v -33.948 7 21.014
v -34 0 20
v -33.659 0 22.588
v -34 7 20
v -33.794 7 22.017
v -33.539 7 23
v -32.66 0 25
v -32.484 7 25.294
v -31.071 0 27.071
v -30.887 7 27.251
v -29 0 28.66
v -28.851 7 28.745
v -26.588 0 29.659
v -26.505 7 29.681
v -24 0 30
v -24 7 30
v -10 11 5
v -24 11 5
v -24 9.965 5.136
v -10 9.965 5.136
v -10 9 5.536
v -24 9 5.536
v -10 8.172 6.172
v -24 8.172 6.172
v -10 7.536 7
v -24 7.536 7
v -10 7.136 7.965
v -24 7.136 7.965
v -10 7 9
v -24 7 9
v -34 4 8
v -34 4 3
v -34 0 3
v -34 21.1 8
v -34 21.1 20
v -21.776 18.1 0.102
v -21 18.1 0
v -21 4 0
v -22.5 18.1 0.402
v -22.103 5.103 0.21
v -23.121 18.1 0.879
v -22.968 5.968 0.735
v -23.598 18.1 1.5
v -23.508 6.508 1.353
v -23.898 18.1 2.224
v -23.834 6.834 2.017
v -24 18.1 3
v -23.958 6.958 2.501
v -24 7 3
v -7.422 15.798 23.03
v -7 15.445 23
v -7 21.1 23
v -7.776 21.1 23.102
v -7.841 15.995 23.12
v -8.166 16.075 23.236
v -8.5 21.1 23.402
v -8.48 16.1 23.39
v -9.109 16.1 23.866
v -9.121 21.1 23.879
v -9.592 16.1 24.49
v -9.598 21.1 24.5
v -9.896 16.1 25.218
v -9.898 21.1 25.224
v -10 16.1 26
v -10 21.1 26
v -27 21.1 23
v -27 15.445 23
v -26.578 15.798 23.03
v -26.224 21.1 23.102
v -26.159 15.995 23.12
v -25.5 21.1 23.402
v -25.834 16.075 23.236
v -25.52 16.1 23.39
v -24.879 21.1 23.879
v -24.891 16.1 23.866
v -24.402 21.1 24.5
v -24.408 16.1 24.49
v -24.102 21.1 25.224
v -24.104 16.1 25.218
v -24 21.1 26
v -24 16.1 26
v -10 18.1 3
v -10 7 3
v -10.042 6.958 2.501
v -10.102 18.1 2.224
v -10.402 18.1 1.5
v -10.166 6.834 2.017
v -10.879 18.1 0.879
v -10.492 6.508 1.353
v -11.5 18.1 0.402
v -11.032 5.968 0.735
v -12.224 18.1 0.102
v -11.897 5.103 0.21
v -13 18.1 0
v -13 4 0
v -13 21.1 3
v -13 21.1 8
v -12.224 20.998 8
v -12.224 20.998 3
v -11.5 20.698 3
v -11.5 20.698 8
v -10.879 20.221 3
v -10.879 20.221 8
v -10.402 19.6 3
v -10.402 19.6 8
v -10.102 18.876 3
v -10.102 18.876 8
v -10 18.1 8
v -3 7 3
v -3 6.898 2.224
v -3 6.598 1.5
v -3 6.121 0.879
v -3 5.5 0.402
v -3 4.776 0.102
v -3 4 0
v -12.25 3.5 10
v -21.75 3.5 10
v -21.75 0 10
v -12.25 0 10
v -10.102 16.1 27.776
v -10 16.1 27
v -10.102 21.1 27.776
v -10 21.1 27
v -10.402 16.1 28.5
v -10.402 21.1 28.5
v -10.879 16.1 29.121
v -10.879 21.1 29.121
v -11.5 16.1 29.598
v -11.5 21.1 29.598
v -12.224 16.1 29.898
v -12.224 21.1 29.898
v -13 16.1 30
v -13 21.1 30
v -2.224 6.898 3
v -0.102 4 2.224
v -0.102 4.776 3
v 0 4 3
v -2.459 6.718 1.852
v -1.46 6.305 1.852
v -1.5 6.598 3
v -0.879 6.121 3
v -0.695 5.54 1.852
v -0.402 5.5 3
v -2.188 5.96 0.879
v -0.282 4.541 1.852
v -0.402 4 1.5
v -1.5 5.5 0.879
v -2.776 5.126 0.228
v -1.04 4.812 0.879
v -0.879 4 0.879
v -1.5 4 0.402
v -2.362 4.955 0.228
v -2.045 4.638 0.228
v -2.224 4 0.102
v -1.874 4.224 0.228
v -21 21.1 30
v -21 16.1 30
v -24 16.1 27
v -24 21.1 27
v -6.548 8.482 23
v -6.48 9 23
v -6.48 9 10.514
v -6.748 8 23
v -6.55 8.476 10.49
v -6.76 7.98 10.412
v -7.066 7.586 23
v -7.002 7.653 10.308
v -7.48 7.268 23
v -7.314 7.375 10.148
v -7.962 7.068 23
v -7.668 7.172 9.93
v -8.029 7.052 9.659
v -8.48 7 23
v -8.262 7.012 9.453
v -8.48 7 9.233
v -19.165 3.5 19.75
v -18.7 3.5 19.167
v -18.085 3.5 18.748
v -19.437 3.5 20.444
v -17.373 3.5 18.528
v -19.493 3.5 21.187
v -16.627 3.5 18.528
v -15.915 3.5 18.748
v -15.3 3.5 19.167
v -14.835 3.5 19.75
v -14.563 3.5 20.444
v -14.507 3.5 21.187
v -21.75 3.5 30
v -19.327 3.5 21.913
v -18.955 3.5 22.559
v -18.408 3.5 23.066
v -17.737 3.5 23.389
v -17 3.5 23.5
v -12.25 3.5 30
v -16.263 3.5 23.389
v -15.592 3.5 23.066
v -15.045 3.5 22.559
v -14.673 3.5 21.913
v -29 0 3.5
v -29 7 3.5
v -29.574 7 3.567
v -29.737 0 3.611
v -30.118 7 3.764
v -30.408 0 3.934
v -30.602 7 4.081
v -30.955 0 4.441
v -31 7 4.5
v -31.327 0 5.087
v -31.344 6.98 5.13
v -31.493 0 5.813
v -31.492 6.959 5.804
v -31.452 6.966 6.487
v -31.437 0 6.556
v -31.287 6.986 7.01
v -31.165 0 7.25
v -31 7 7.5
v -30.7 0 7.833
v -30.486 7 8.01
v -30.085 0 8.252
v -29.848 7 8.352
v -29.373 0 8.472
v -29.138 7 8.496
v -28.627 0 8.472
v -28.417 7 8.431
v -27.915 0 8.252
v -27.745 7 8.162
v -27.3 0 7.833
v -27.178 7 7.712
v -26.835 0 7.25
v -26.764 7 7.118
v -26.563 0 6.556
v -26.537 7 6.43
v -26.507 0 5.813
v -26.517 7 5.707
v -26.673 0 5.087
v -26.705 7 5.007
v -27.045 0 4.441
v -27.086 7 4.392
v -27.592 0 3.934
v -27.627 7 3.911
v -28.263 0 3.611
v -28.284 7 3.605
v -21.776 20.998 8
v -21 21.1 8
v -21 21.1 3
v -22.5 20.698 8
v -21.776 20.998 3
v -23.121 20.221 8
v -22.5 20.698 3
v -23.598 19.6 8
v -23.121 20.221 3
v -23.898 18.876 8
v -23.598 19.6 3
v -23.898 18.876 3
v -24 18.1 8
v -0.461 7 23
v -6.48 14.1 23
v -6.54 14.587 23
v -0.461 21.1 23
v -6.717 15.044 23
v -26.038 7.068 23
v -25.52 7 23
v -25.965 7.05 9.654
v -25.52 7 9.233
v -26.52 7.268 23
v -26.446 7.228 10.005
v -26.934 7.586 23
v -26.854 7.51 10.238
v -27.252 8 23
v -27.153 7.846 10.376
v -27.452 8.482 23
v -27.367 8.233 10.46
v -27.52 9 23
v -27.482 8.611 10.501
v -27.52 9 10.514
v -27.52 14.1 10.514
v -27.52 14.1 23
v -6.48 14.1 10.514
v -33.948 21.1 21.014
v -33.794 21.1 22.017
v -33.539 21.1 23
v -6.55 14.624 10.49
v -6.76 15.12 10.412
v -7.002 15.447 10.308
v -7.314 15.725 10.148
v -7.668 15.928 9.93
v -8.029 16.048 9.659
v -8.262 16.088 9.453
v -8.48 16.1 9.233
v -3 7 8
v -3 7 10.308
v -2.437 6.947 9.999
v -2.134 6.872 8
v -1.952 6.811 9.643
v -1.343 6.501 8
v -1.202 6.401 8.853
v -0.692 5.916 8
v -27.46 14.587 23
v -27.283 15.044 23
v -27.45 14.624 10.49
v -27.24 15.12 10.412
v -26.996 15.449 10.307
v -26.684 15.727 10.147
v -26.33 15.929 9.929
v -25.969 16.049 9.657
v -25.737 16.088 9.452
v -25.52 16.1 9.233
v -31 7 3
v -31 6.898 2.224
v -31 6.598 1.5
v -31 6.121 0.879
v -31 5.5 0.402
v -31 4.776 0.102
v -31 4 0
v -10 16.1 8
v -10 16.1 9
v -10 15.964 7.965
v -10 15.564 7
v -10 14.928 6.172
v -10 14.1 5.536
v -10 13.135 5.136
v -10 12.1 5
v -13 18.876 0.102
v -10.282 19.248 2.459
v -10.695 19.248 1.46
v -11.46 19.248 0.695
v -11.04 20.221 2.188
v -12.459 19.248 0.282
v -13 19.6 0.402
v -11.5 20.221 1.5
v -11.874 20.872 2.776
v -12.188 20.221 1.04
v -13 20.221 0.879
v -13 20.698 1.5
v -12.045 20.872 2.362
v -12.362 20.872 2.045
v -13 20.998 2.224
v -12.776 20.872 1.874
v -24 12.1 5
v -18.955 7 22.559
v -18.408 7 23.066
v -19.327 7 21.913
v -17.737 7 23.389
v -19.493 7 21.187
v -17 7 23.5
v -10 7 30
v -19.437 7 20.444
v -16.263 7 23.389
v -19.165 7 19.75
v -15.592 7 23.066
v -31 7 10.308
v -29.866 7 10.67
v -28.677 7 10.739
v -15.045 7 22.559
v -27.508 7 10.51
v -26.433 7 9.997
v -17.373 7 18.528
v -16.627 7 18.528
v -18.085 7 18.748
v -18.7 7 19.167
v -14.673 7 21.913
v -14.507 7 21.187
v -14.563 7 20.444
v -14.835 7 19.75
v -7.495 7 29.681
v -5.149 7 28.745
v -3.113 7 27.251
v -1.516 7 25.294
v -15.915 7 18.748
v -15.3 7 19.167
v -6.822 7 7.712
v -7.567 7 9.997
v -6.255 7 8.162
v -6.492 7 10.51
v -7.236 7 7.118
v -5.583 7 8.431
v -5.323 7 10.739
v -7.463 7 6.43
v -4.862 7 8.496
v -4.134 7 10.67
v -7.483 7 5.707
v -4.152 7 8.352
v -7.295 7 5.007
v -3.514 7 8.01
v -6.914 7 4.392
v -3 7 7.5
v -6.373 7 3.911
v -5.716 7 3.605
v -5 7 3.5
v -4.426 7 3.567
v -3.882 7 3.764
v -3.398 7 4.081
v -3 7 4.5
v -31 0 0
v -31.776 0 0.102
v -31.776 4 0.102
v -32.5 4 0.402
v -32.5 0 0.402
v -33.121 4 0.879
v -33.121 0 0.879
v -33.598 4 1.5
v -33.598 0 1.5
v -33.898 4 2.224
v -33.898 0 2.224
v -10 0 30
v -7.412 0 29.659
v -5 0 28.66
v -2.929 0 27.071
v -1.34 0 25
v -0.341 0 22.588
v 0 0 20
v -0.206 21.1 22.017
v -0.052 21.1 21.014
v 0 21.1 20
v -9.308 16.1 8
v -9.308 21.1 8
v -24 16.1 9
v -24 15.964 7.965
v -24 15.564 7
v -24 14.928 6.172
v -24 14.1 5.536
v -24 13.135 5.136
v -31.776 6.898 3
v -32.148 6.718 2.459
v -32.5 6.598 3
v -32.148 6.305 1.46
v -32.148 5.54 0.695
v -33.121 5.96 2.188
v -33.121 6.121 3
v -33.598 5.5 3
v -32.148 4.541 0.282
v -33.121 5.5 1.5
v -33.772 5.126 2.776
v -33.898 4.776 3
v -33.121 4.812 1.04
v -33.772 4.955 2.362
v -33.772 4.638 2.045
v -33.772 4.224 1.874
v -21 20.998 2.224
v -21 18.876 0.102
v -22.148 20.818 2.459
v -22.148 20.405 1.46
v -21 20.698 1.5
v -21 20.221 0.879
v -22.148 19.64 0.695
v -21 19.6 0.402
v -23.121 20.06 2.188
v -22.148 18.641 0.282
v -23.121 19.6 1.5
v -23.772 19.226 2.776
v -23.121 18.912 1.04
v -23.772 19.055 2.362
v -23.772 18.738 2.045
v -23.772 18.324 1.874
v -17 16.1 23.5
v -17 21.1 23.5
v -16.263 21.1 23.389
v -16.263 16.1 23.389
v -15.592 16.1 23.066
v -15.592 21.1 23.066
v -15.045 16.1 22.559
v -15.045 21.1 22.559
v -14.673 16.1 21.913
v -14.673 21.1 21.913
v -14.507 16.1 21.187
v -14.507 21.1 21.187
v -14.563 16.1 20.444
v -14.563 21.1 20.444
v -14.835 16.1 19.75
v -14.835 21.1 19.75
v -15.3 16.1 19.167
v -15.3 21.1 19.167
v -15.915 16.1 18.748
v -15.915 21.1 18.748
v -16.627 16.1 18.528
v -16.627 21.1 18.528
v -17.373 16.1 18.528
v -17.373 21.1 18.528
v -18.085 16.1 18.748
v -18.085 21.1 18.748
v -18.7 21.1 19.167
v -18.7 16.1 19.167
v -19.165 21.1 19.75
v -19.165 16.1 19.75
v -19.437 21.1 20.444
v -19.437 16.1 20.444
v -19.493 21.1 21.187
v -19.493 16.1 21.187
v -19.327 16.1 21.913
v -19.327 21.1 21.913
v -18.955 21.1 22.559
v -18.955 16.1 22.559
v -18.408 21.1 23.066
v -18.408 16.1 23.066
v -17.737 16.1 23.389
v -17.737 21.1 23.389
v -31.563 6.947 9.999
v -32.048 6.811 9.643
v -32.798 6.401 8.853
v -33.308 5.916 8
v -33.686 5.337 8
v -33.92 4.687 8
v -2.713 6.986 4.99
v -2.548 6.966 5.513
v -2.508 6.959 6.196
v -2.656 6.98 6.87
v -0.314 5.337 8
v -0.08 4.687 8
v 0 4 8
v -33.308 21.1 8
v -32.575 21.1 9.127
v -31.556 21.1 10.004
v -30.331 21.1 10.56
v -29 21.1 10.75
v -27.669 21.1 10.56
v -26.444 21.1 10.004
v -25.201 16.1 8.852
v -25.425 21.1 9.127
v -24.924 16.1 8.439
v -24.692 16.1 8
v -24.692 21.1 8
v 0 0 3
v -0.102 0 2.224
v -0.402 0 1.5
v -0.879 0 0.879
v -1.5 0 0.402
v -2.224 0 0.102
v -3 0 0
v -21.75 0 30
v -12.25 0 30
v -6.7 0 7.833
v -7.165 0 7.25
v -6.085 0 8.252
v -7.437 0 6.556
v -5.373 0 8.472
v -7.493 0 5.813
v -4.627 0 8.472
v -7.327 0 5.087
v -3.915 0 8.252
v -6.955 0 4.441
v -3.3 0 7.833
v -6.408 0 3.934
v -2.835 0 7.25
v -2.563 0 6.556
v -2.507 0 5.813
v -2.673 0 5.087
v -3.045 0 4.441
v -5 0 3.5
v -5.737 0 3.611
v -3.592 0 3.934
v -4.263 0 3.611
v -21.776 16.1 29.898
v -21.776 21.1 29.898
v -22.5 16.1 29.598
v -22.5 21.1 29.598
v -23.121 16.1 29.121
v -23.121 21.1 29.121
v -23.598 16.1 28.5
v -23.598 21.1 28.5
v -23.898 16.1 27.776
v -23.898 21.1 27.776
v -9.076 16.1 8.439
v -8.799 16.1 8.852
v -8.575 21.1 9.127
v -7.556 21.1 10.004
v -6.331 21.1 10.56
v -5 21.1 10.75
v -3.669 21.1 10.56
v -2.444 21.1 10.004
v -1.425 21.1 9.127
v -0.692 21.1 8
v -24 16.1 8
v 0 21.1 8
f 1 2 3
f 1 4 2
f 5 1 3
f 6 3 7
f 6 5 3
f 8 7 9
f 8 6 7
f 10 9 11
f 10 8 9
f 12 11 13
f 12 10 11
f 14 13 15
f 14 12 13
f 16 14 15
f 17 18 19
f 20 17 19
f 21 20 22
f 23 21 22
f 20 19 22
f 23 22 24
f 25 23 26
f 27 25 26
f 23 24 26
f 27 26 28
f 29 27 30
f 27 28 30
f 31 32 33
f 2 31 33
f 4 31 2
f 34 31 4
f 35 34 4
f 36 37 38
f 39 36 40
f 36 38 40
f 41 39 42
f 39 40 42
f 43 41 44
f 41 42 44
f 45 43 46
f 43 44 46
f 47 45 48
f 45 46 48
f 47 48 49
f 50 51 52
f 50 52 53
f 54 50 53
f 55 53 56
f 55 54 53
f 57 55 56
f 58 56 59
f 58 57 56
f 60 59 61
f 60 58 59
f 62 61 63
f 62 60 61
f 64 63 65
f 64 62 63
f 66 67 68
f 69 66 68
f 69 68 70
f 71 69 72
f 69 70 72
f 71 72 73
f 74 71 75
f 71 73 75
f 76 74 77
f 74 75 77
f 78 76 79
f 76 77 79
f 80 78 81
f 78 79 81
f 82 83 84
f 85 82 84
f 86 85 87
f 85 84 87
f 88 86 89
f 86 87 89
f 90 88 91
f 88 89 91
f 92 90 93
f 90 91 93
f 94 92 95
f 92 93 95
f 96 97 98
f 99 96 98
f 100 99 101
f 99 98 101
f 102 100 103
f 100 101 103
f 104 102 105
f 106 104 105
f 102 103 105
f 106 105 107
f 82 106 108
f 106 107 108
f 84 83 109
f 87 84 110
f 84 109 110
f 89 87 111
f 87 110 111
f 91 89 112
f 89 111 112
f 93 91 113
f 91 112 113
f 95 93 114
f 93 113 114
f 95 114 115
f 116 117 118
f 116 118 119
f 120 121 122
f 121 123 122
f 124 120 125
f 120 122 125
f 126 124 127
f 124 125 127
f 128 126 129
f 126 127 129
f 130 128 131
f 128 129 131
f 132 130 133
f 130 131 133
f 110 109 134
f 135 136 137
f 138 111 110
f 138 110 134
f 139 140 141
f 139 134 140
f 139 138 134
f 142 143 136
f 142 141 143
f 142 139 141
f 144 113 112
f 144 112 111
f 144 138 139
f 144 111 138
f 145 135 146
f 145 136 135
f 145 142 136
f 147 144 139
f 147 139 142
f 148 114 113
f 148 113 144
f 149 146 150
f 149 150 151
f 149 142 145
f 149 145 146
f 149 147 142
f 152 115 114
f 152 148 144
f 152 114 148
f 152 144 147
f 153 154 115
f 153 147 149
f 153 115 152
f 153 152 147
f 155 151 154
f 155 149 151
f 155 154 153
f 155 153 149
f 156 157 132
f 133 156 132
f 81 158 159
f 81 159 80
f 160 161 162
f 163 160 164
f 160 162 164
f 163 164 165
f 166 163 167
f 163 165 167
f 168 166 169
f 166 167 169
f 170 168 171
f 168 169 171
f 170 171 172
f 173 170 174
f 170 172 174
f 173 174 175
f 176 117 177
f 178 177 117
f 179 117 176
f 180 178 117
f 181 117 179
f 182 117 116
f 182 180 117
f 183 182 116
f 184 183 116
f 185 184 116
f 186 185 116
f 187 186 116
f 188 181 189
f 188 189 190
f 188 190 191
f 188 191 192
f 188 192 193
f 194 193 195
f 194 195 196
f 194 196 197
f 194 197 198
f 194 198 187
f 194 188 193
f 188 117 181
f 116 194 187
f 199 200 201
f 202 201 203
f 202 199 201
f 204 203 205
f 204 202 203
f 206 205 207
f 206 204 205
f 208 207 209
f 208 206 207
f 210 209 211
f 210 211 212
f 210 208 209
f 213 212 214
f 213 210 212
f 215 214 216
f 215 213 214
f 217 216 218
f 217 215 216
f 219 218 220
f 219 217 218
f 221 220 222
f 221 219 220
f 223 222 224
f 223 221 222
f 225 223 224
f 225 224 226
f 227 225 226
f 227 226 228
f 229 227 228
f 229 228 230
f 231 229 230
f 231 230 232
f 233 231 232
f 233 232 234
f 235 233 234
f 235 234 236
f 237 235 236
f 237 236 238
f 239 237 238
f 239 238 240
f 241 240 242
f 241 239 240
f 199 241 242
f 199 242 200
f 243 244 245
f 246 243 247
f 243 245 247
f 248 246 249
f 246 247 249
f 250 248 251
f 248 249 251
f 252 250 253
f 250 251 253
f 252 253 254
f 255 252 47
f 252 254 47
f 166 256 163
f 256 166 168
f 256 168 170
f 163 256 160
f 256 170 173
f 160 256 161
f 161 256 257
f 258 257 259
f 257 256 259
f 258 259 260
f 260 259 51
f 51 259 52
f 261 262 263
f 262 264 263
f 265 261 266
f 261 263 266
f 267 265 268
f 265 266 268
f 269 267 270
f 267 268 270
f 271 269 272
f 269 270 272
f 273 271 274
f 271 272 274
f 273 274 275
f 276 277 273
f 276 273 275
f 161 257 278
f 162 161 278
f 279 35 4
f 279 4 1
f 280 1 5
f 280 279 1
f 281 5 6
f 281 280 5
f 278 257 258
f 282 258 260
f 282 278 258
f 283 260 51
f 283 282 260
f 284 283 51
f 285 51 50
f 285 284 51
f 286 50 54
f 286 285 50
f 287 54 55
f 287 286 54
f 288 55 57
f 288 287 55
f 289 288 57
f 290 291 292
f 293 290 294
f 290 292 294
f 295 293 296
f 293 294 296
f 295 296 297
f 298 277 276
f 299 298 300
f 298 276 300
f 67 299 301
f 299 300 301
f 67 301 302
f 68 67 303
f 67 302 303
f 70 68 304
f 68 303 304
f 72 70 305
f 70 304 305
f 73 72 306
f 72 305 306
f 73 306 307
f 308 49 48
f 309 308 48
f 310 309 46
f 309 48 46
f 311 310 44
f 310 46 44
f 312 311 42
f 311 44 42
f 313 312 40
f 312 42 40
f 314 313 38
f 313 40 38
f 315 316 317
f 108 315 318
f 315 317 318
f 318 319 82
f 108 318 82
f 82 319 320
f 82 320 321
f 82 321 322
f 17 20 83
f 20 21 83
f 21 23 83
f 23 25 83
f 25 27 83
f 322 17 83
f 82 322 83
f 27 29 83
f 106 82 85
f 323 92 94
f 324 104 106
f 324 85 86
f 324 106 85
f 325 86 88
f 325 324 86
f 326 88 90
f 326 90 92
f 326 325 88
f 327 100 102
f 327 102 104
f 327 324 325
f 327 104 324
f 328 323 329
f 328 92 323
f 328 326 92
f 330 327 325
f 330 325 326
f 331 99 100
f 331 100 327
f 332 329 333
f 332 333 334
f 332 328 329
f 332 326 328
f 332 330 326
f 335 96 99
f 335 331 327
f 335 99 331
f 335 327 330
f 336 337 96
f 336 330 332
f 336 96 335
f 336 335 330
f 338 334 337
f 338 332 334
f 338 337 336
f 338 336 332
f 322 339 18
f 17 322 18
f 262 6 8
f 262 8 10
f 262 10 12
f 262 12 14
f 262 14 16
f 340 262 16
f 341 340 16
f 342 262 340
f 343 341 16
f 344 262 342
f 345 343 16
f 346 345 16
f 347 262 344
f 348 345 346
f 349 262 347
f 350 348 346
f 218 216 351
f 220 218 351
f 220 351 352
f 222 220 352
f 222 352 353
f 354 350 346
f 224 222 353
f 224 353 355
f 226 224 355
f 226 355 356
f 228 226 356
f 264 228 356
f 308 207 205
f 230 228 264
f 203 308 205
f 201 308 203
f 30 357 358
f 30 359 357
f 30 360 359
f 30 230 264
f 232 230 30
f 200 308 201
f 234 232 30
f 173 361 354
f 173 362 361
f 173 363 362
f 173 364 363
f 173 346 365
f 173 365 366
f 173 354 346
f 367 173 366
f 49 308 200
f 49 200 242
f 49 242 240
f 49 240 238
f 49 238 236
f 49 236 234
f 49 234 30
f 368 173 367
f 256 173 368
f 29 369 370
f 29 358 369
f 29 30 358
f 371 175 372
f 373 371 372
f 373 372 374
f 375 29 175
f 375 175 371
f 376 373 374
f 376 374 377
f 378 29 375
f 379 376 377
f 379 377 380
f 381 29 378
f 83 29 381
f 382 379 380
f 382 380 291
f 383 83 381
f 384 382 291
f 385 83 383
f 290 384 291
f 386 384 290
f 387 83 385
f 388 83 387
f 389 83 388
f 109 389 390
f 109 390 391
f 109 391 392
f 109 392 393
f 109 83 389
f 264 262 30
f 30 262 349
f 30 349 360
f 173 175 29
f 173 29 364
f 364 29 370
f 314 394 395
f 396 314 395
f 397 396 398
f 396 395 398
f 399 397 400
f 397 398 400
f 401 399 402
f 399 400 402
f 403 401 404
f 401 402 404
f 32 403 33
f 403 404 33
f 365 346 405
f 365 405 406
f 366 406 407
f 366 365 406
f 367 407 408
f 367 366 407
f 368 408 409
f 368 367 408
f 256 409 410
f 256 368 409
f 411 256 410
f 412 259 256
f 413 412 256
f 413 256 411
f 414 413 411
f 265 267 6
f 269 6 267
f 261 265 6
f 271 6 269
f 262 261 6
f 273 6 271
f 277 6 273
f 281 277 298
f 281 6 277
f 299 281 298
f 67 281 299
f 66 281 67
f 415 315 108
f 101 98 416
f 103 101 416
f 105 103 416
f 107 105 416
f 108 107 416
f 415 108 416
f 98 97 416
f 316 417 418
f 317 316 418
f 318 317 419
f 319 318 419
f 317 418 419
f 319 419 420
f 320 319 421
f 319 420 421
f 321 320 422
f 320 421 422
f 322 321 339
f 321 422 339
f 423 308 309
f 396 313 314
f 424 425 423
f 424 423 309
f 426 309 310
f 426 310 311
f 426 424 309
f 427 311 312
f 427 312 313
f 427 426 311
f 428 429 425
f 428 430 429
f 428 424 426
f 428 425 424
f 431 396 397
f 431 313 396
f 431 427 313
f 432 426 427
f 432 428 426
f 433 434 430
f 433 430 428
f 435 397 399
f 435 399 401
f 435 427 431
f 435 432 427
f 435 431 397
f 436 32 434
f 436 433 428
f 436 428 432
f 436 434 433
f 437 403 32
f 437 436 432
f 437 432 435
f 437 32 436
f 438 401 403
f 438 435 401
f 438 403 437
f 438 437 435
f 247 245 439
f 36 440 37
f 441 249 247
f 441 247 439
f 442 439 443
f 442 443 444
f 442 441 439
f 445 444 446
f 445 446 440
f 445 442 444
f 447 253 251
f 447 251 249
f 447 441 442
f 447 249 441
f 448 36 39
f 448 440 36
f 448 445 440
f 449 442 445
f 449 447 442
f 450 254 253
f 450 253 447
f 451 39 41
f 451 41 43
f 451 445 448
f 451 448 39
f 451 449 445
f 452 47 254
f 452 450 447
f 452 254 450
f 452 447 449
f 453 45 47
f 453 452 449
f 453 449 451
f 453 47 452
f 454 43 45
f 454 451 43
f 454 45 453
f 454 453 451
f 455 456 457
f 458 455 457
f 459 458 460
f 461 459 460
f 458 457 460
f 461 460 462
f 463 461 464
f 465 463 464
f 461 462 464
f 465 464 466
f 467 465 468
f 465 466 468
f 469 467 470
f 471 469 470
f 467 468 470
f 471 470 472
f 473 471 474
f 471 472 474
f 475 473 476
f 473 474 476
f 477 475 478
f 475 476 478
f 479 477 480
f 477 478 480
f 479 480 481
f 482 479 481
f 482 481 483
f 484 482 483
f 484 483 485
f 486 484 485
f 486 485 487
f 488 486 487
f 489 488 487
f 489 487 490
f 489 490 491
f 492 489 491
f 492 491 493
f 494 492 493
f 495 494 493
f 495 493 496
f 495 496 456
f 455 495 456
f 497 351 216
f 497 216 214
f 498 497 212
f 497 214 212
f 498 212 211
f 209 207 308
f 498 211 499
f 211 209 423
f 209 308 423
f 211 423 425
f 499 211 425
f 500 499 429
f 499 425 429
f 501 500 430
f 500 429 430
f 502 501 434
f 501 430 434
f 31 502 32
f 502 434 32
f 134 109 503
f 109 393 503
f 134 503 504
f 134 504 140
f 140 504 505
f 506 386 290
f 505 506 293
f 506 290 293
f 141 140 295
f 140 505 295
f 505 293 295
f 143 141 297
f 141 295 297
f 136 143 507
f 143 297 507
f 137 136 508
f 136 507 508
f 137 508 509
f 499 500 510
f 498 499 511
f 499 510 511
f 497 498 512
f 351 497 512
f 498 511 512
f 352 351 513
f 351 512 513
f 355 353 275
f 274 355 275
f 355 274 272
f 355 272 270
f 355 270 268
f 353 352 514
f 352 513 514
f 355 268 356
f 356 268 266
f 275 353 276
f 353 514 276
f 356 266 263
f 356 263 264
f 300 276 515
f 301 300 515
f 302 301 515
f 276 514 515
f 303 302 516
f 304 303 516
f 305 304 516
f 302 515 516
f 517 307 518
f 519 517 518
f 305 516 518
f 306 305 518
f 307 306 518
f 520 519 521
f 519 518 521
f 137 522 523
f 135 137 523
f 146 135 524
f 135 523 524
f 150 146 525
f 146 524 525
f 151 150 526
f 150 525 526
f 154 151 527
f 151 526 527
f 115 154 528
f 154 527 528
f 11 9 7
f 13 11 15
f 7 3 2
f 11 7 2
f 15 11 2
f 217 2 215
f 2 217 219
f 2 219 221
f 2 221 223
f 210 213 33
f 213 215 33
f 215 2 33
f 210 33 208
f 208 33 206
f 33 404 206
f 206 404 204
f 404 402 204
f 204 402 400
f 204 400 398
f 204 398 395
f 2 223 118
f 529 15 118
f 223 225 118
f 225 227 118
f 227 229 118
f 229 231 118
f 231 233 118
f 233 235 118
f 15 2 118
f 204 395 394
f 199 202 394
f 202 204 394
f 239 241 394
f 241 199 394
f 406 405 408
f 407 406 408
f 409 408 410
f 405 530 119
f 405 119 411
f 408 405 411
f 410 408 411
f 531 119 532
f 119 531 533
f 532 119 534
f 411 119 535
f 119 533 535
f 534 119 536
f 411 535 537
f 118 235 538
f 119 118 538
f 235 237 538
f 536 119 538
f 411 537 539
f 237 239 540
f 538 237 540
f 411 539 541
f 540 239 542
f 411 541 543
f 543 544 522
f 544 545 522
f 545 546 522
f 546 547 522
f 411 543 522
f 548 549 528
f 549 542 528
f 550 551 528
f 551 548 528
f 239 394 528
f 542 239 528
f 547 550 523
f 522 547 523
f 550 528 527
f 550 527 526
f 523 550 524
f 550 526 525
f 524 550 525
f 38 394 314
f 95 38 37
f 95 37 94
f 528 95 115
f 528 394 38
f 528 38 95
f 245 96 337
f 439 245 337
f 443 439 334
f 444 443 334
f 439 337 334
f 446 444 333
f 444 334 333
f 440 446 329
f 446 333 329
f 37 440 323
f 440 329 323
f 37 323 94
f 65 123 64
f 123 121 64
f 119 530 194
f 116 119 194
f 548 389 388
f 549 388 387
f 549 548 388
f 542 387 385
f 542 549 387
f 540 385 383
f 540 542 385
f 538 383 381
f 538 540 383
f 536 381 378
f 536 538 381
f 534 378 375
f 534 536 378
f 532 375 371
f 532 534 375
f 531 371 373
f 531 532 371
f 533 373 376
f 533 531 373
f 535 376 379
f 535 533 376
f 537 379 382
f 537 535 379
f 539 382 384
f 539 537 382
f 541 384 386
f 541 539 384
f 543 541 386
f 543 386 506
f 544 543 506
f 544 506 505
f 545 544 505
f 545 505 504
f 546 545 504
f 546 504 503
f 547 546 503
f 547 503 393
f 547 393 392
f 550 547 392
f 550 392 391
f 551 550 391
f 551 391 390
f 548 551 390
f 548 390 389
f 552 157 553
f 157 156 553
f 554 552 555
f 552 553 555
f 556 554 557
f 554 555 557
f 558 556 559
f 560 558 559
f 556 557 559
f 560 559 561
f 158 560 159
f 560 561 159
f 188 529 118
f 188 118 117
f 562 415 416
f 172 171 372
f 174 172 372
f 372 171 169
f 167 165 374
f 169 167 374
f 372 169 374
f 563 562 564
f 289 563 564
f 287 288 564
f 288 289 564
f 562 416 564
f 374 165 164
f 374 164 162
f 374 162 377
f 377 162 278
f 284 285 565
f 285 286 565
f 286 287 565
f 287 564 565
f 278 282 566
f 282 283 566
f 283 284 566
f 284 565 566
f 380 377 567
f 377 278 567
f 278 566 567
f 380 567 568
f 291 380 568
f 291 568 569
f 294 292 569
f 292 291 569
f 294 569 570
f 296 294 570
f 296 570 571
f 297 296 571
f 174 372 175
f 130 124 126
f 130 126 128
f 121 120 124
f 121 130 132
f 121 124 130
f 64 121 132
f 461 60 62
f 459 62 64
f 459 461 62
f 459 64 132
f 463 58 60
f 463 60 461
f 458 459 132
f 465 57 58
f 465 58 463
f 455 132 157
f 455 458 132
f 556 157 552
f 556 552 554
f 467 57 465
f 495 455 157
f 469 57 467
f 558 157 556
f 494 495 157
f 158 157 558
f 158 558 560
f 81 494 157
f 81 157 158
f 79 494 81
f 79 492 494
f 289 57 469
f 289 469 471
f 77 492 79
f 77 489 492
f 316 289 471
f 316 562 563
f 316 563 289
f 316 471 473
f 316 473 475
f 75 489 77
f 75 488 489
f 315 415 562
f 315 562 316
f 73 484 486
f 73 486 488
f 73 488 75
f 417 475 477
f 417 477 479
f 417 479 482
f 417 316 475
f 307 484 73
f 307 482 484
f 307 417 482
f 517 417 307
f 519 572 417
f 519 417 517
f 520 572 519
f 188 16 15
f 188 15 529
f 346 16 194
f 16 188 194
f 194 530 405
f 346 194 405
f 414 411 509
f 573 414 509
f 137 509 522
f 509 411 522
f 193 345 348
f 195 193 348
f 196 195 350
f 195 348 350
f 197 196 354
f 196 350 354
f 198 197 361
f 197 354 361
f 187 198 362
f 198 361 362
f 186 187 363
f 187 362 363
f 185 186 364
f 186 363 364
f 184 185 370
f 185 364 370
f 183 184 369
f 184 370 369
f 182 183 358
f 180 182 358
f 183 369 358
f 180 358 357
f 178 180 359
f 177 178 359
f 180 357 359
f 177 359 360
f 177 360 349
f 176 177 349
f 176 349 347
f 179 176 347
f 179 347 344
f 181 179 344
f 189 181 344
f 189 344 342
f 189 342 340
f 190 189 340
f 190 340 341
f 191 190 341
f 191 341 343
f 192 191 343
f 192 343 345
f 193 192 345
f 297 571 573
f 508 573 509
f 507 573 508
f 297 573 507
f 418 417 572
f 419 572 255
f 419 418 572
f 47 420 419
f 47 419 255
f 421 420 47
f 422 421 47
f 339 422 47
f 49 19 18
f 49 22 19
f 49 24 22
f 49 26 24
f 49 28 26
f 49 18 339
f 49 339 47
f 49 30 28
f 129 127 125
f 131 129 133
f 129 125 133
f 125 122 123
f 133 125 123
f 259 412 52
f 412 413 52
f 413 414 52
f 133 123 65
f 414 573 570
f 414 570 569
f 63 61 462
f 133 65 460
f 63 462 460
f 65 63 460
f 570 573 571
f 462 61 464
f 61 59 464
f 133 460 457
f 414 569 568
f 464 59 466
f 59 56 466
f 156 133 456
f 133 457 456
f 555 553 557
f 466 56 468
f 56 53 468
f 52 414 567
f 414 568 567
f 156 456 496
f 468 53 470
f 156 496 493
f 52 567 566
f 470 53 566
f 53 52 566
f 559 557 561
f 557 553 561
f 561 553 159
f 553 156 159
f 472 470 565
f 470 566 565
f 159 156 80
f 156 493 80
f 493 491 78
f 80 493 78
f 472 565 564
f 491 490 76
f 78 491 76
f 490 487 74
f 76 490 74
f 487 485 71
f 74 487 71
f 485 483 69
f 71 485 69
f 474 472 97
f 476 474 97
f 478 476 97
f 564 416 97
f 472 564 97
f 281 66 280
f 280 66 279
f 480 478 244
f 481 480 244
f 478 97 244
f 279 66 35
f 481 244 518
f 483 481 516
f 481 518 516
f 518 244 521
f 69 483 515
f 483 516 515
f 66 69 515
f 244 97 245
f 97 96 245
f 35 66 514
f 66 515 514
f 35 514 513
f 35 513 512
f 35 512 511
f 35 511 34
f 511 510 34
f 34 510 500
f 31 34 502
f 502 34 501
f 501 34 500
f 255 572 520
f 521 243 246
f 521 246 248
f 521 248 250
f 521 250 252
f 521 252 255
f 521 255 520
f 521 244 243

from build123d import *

# Parameters (mm, degrees)
CROQUIS1_W              = 34
CROQUIS1_H              = 30
CROQUIS1_R              = 2.5
SALIENTE_EXTRUIR1_DEPTH = 7
REDONDEO1_R             = 10
CROQUIS2_W              = 14
CROQUIS2_H              = 30
SALIENTE_EXTRUIR2_DEPTH = 14.1
CORTAR_EXTRUIR1_REACH   = 45.832
CORTAR_EXTRUIR2_REACH   = 52.012
CROQUIS4_R              = 2.5
CROQUIS5_W              = 9.5
CROQUIS5_H              = 3.5
CORTAR_EXTRUIR3_DEPTH   = 20
SALIENTE_EXTRUIR3_DEPTH = 5
SALIENTE_EXTRUIR4_DEPTH = 9.1
CORTAR_EXTRUIR4_REACH   = 52.012
CROQUIS8_R              = 4.75
REDONDEO5_R             = 2
REDONDEO6_R             = 3
REDONDEO7_R             = 3


with BuildPart() as part:
    # Croquis1 → Saliente-Extruir1 (new body)
    with BuildSketch(Plane(origin=(0, 0, 0), x_dir=(1, 0, 0), z_dir=(0, 1, 0))):
        with Locations((-17, -15)):
            Rectangle(CROQUIS1_W, CROQUIS1_H)
        with Locations(Location((-29, -6, 0), (0, 0, 90))):
            Circle(CROQUIS1_R, mode=Mode.SUBTRACT)
        with Locations(Location((-5, -6, 0), (0, 0, 90))):
            Circle(CROQUIS1_R, mode=Mode.SUBTRACT)
    extrude(amount=SALIENTE_EXTRUIR1_DEPTH)

    # Redondeo1
    redondeo1_edges = [part.edges().sort_by_distance(p)[0] for p in [
        (0, 3.5, 30),
        (-34, 3.5, 30),
    ]]
    fillet(redondeo1_edges, radius=REDONDEO1_R)

    # Croquis2 → Saliente-Extruir2 (add)
    with BuildSketch(Plane(origin=(0, 7, 0), x_dir=(1, 0, 0), z_dir=(0, 1, 0))):
        with Locations((-17, -15)):
            Rectangle(CROQUIS2_W, CROQUIS2_H)
    extrude(amount=SALIENTE_EXTRUIR2_DEPTH)

    # Croquis3 → Cortar-Extruir1 (cut, up to next)
    with BuildSketch(Plane.ZY.offset(24), mode=Mode.PRIVATE) as cortar_extruir1_sk1:
        with BuildLine():
            Line((9, 7), (30, 7))
            Line((30, 7), (30, 16.1))
            Line((30, 16.1), (23, 16.1))
            Line((23, 16.1), (9, 16.1))
            ThreePointArc((9, 16.1), (6.171572875, 14.928427125), (5, 12.1))
            Line((5, 12.1), (5, 11))
            ThreePointArc((5, 11), (6.171572875, 8.171572875), (9, 7))
        make_face()
    cortar_extruir1_tool1 = extrude(cortar_extruir1_sk1.sketch, amount=-CORTAR_EXTRUIR1_REACH, mode=Mode.PRIVATE) & part.part
    add(cortar_extruir1_tool1.solids().sort_by_distance((-24, 11.55, 17.861257))[0], mode=Mode.SUBTRACT)

    # Cortar-Extruir2: up to this face of the body (flat: up to its plane)
    cortar_extruir2_end = Plane(part.part.faces().sort_by_distance((-17, 0, 14.792595458))[0])
    # Croquis4 → Cortar-Extruir2 (cut, up to the picked face)
    with BuildSketch(Plane(origin=(0, 21.1, 0), x_dir=(1, 0, 0), z_dir=(0, 1, 0)), mode=Mode.PRIVATE) as cortar_extruir2_sk1:
        with Locations(Location((-17, -21, 0), (0, 0, 270))):
            Circle(CROQUIS4_R)
    cortar_extruir2_tool1 = split(extrude(cortar_extruir2_sk1.sketch, amount=-CORTAR_EXTRUIR2_REACH, mode=Mode.PRIVATE), bisect_by=cortar_extruir2_end, keep=Keep.BOTH, mode=Mode.PRIVATE)
    add(cortar_extruir2_tool1.solids().sort_by(Axis((-17, 21.1, 21), (0, -1, 0)))[0], mode=Mode.SUBTRACT)

    # Croquis5 → Cortar-Extruir3 (cut)
    with BuildSketch(Plane.XY.offset(30)):
        with Locations((-17, 1.75)):
            Rectangle(CROQUIS5_W, CROQUIS5_H)
    extrude(amount=-CORTAR_EXTRUIR3_DEPTH, mode=Mode.SUBTRACT)

    # Croquis6 → Saliente-Extruir3 (add)
    with BuildSketch(Plane(origin=(0, 21.1, 0), x_dir=(1, 0, 0), z_dir=(0, 1, 0))):
        with BuildLine():
            Line((-24, -23), (-33.539392014, -23))
            ThreePointArc((-33.539392014, -23), (-33.884177258, -21.517576993), (-34, -20))
            Line((-34, -20), (-34, -8))
            Line((-34, -8), (-24, -8))
            Line((-24, -8), (-24, -23))
        make_face()
        with BuildLine():
            Line((-10, -23), (-0.460607986, -23))
            ThreePointArc((-0.460607986, -23), (-0.115822742, -21.517576993), (0, -20))
            Line((0, -20), (0, -8))
            Line((0, -8), (-10, -8))
            Line((-10, -8), (-10, -23))
        make_face()
    extrude(amount=-SALIENTE_EXTRUIR3_DEPTH)

    # Croquis7 → Saliente-Extruir4 (add)
    with BuildSketch(Plane.XZ.offset(-16.1)):
        with BuildLine():
            Line((-27.52, 8), (-34, 8))
            Line((-34, 8), (-34, 20))
            ThreePointArc((-34, 20), (-33.884177258, 21.517576993), (-33.539392014, 23))
            Line((-33.539392014, 23), (-27.52, 23))
            Line((-27.52, 23), (-27.52, 8))
        make_face()
        with BuildLine():
            Line((0, 8), (0, 20))
            ThreePointArc((0, 20), (-0.115822742, 21.517576993), (-0.460607986, 23))
            Line((-0.460607986, 23), (-6.48, 23))
            Line((-6.48, 23), (-6.48, 8))
            Line((-6.48, 8), (0, 8))
        make_face()
    extrude(amount=SALIENTE_EXTRUIR4_DEPTH)

    # Cortar-Extruir4: up to this face of the body (flat: up to its plane)
    cortar_extruir4_end = Plane(part.part.faces().sort_by_distance((-17, 7, 16.508515524))[0])
    # Croquis8 → Cortar-Extruir4 (cut, up to the picked face)
    with BuildSketch(Plane(origin=(0, 21.1, 0), x_dir=(1, 0, 0), z_dir=(0, 1, 0)), mode=Mode.PRIVATE) as cortar_extruir4_sk1:
        with Locations((-29, -6)):
            Circle(CROQUIS8_R)
    cortar_extruir4_tool1 = split(extrude(cortar_extruir4_sk1.sketch, amount=-CORTAR_EXTRUIR4_REACH, mode=Mode.PRIVATE), bisect_by=cortar_extruir4_end, keep=Keep.BOTH, mode=Mode.PRIVATE)
    # Croquis8 → Cortar-Extruir4 (cut, up to the picked face)
    with BuildSketch(Plane(origin=(0, 21.1, 0), x_dir=(1, 0, 0), z_dir=(0, 1, 0)), mode=Mode.PRIVATE) as cortar_extruir4_sk2:
        with Locations((-5, -6)):
            Circle(CROQUIS8_R)
    cortar_extruir4_tool2 = split(extrude(cortar_extruir4_sk2.sketch, amount=-CORTAR_EXTRUIR4_REACH, mode=Mode.PRIVATE), bisect_by=cortar_extruir4_end, keep=Keep.BOTH, mode=Mode.PRIVATE)
    add(cortar_extruir4_tool1.solids().sort_by(Axis((-29, 21.1, 6), (0, -1, 0)))[0], mode=Mode.SUBTRACT)
    add(cortar_extruir4_tool2.solids().sort_by(Axis((-5, 21.1, 6), (0, -1, 0)))[0], mode=Mode.SUBTRACT)

    # Redondeo5
    redondeo5_edges = [part.edges().sort_by_distance(p)[0] for p in [
        (-6.48, 7, 16.756773139),
        (-6.48, 16.1, 16.756773139),
        (-27.52, 16.1, 16.756773139),
        (-27.52, 7, 16.756773139),
    ]]
    fillet(redondeo5_edges, radius=REDONDEO5_R)

    # Redondeo6
    redondeo6_edges = [part.edges().sort_by_distance(p)[0] for p in [
        (-24, 18.6, 23),
        (-10, 18.6, 23),
        (-10, 18.6, 30),
        (-24, 18.6, 30),
    ]]
    fillet(redondeo6_edges, radius=REDONDEO6_R)

    # Redondeo7
    # the kernel refuses this fillet: 3 mm, written as the material it takes off along each edge
    with BuildSketch(Plane(origin=(-3, 4, 3), x_dir=(0, 1, 0), z_dir=(0, 0, -1))) as redondeo7_piece_1_section:
        Polygon((0, 0), (REDONDEO7_R, 0), (REDONDEO7_R, REDONDEO7_R), (0, REDONDEO7_R), align=None)
    redondeo7_piece_1 = extrude(amount=REDONDEO7_R, mode=Mode.PRIVATE)
    redondeo7_piece_1 = redondeo7_piece_1 - Plane(origin=(-3, 4, 3), x_dir=(-0.7071067811865475, -0.7071067811865475, 0), z_dir=(0, 0, -1)) * Sphere(REDONDEO7_R, mode=Mode.PRIVATE)
    add(redondeo7_piece_1, mode=Mode.SUBTRACT)
    with BuildSketch(Plane(origin=(-31, 4, 3), x_dir=(0, 1, 0), z_dir=(-1, 0, 0))) as redondeo7_piece_2_section:
        Polygon((0, 0), (REDONDEO7_R, 0), (REDONDEO7_R, REDONDEO7_R), (0, REDONDEO7_R), align=None)
    redondeo7_piece_2 = extrude(amount=REDONDEO7_R, mode=Mode.PRIVATE)
    redondeo7_piece_2 = redondeo7_piece_2 - Plane(origin=(-31, 4, 3), x_dir=(0, -0.7071067811865475, 0.7071067811865475), z_dir=(-1, 0, 0)) * Sphere(REDONDEO7_R, mode=Mode.PRIVATE)
    add(redondeo7_piece_2, mode=Mode.SUBTRACT)
    with BuildSketch(Plane(origin=(-21, 18.1, 3), x_dir=(0, 1, 0), z_dir=(-1, 0, 0))) as redondeo7_piece_3_section:
        Polygon((0, 0), (REDONDEO7_R, 0), (REDONDEO7_R, REDONDEO7_R), (0, REDONDEO7_R), align=None)
    redondeo7_piece_3 = extrude(amount=REDONDEO7_R, mode=Mode.PRIVATE)
    redondeo7_piece_3 = redondeo7_piece_3 - Plane(origin=(-21, 18.1, 3), x_dir=(0, -0.7071067811865475, 0.7071067811865475), z_dir=(-1, 0, 0)) * Sphere(REDONDEO7_R, mode=Mode.PRIVATE)
    add(redondeo7_piece_3, mode=Mode.SUBTRACT)
    with BuildSketch(Plane(origin=(-13, 18.1, 3), x_dir=(1, 0, 0), z_dir=(0, 1, 0))) as redondeo7_piece_4_section:
        Polygon((0, 0), (REDONDEO7_R, 0), (REDONDEO7_R, REDONDEO7_R), (0, REDONDEO7_R), align=None)
    redondeo7_piece_4 = extrude(amount=REDONDEO7_R, mode=Mode.PRIVATE)
    redondeo7_piece_4 = redondeo7_piece_4 - Plane(origin=(-13, 18.1, 3), x_dir=(-0.7071067811865468, 0, 0.707106781186548), z_dir=(0, 1, 0)) * Sphere(REDONDEO7_R, mode=Mode.PRIVATE)
    add(redondeo7_piece_4, mode=Mode.SUBTRACT)
    with BuildSketch(Plane(origin=(0, -7.5, 0), x_dir=(0, 0, 1), z_dir=(0, 1, 0)), Plane(origin=(-34, -7.5, 0), x_dir=(1, 0, 0), z_dir=(0, 1, 0))) as redondeo7_piece_5:
        with BuildLine():
            CenterArc((REDONDEO7_R, -REDONDEO7_R), REDONDEO7_R, 90, 90)
            Line((0, -REDONDEO7_R), (0, 0))
            Line((0, 0), (REDONDEO7_R, 0))
        make_face()
    extrude(amount=11.5, mode=Mode.SUBTRACT)
    with BuildSketch(Plane(origin=(-34, 7, 3), x_dir=(1, 0, 0), z_dir=(0, 0, 1))) as redondeo7_piece_6_section:
        with BuildLine():
            CenterArc((REDONDEO7_R, -REDONDEO7_R), REDONDEO7_R, 90, 90)
            Line((0, -REDONDEO7_R), (0, 0))
            Line((0, 0), (REDONDEO7_R, 0))
        make_face()
    redondeo7_piece_6 = extrude(amount=5, mode=Mode.PRIVATE)
    redondeo7_piece_6 = redondeo7_piece_6 & Plane(origin=(-29, 6.638457851, 6), x_dir=(1, 0, 0), z_dir=(0, 1, 0)) * Cylinder(4.75, 23, mode=Mode.PRIVATE)
    add(redondeo7_piece_6, mode=Mode.SUBTRACT)
    with BuildSketch(Plane(origin=(-34, 7, 3), x_dir=(1, 0, 0), z_dir=(0, 0, 1))) as redondeo7_piece_7_section:
        with BuildLine():
            CenterArc((REDONDEO7_R, -REDONDEO7_R), REDONDEO7_R, 90, 90)
            Line((0, -REDONDEO7_R), (0, 0))
            Line((0, 0), (REDONDEO7_R, 0))
        make_face()
    redondeo7_piece_7 = extrude(amount=5, mode=Mode.PRIVATE)
    redondeo7_piece_7 = redondeo7_piece_7 - Plane(origin=(-29, 5.984939517, 6), x_dir=(1, 0, 0), z_dir=(0, 1, 0)) * Cylinder(4.75, 23, mode=Mode.PRIVATE)
    add(redondeo7_piece_7, mode=Mode.SUBTRACT)
    with BuildSketch(Plane(origin=(-34, 7, 3), x_dir=(1, 0, 0), z_dir=(0, 0, 1))) as redondeo7_piece_8_section:
        with BuildLine():
            CenterArc((REDONDEO7_R, -REDONDEO7_R), REDONDEO7_R, 90, 90)
            Line((0, -REDONDEO7_R), (0, 0))
            Line((0, 0), (REDONDEO7_R, 0))
        make_face()
    redondeo7_piece_8 = extrude(amount=12.5, mode=Mode.PRIVATE)
    redondeo7_piece_8 = split(redondeo7_piece_8, bisect_by=Plane(origin=(-32.327413767, 6.840048654, 8), z_dir=(0, 0, 1)), keep=Keep.TOP, mode=Mode.PRIVATE)
    redondeo7_piece_8 = redondeo7_piece_8 & Plane(origin=(-29, 6.840048654, 6), x_dir=(1, 0, 0), z_dir=(0, 1, 0)) * Cylinder(4.75, 38, mode=Mode.PRIVATE)
    add(redondeo7_piece_8, mode=Mode.SUBTRACT)
    with BuildSketch(Plane(origin=(0, 7, 8), x_dir=(-1, 0, 0), z_dir=(0, 0, -1))) as redondeo7_piece_9_section:
        with BuildLine():
            CenterArc((REDONDEO7_R, -REDONDEO7_R), REDONDEO7_R, 90, 90)
            Line((0, -REDONDEO7_R), (0, 0))
            Line((0, 0), (REDONDEO7_R, 0))
        make_face()
    redondeo7_piece_9 = extrude(amount=5, mode=Mode.PRIVATE)
    redondeo7_piece_9 = redondeo7_piece_9 - Plane(origin=(-5, 5.984939497, 6), x_dir=(1, 0, 0), z_dir=(0, 1, 0)) * Cylinder(4.75, 23, mode=Mode.PRIVATE)
    add(redondeo7_piece_9, mode=Mode.SUBTRACT)
    with BuildSketch(Plane(origin=(0, 7, 15.5), x_dir=(-1, 0, 0), z_dir=(0, 0, -1))) as redondeo7_piece_10_section:
        with BuildLine():
            CenterArc((REDONDEO7_R, -REDONDEO7_R), REDONDEO7_R, 90, 90)
            Line((0, -REDONDEO7_R), (0, 0))
            Line((0, 0), (REDONDEO7_R, 0))
        make_face()
    redondeo7_piece_10 = extrude(amount=12.5, mode=Mode.PRIVATE)
    redondeo7_piece_10 = redondeo7_piece_10 & Plane(origin=(-5, 6.840048634, 6), x_dir=(1, 0, 0), z_dir=(0, 1, 0)) * Cylinder(4.75, 38, mode=Mode.PRIVATE)
    redondeo7_piece_10 = split(redondeo7_piece_10, bisect_by=Plane(origin=(-1.672586324, 6.840048634, 8), z_dir=(0, 0, 1)), keep=Keep.TOP, mode=Mode.PRIVATE)
    add(redondeo7_piece_10, mode=Mode.SUBTRACT)
    with BuildSketch(Plane(origin=(0, 7, 8), x_dir=(-1, 0, 0), z_dir=(0, 0, -1))) as redondeo7_piece_11_section:
        with BuildLine():
            CenterArc((REDONDEO7_R, -REDONDEO7_R), REDONDEO7_R, 90, 90)
            Line((0, -REDONDEO7_R), (0, 0))
            Line((0, 0), (REDONDEO7_R, 0))
        make_face()
    redondeo7_piece_11 = extrude(amount=5, mode=Mode.PRIVATE)
    redondeo7_piece_11 = redondeo7_piece_11 & Plane(origin=(-5, 6.638457797, 6), x_dir=(1, 0, 0), z_dir=(0, 1, 0)) * Cylinder(4.75, 23, mode=Mode.PRIVATE)
    add(redondeo7_piece_11, mode=Mode.SUBTRACT)
    with BuildSketch(Plane(origin=(-3, 7, 0), x_dir=(0, 0, 1), z_dir=(-1, 0, 0)), Plane(origin=(-24, 7, 0), x_dir=(0, 0, 1), z_dir=(-1, 0, 0))) as redondeo7_piece_12:
        with BuildLine():
            CenterArc((REDONDEO7_R, -REDONDEO7_R), REDONDEO7_R, 90, 90)
            Line((0, -REDONDEO7_R), (0, 0))
            Line((0, 0), (REDONDEO7_R, 0))
        make_face()
    extrude(amount=7, mode=Mode.SUBTRACT)
    with BuildSketch(Plane(origin=(-24, 21.1, 3), x_dir=(1, 0, 0), z_dir=(0, 0, 1)), Plane(origin=(-10, 21.1, 8), x_dir=(-1, 0, 0), z_dir=(0, 0, -1))) as redondeo7_piece_13:
        with BuildLine():
            CenterArc((REDONDEO7_R, -REDONDEO7_R), REDONDEO7_R, 90, 90)
            Line((0, -REDONDEO7_R), (0, 0))
            Line((0, 0), (REDONDEO7_R, 0))
        make_face()
    extrude(amount=5, mode=Mode.SUBTRACT)
    with BuildSketch(Plane(origin=(-10, 7, 0), x_dir=(0, 0, 1), z_dir=(0, 1, 0)), Plane(origin=(-24, 7, 0), x_dir=(1, 0, 0), z_dir=(0, 1, 0))) as redondeo7_piece_14:
        with BuildLine():
            CenterArc((REDONDEO7_R, -REDONDEO7_R), REDONDEO7_R, 90, 90)
            Line((0, -REDONDEO7_R), (0, 0))
            Line((0, 0), (REDONDEO7_R, 0))
        make_face()
    extrude(amount=11.1, mode=Mode.SUBTRACT)
    with BuildSketch(Plane(origin=(-13, 21.1, 0), x_dir=(0, 0, 1), z_dir=(-1, 0, 0))) as redondeo7_piece_15:
        with BuildLine():
            CenterArc((REDONDEO7_R, -REDONDEO7_R), REDONDEO7_R, 90, 90)
            Line((0, -REDONDEO7_R), (0, 0))
            Line((0, 0), (REDONDEO7_R, 0))
        make_face()
    extrude(amount=8, mode=Mode.SUBTRACT)
    with BuildSketch(Plane(origin=(-3, 7, 0), x_dir=(0, 0, 1), z_dir=(-1, 0, 0))) as redondeo7_piece_16a_section:
        with BuildLine():
            CenterArc((REDONDEO7_R, -REDONDEO7_R), REDONDEO7_R, 90, 90)
            Line((0, -REDONDEO7_R), (0, 0))
            Line((0, 0), (REDONDEO7_R, 0))
        make_face()
    redondeo7_piece_16a = extrude(amount=14.5, mode=Mode.PRIVATE)
    redondeo7_piece_16a = split(redondeo7_piece_16a, bisect_by=Plane(origin=(-10, 6.320814657, 0.679185343), z_dir=(-1, 0, 0)), keep=Keep.TOP, mode=Mode.PRIVATE)
    with BuildSketch(Plane(origin=(-10, -0.5, 0), x_dir=(0, 0, 1), z_dir=(0, 1, 0))) as redondeo7_piece_16b_section:
        with BuildLine():
            CenterArc((REDONDEO7_R, -REDONDEO7_R), REDONDEO7_R, 90, 90)
            Line((0, -REDONDEO7_R), (0, 0))
            Line((0, 0), (REDONDEO7_R, 0))
        make_face()
    redondeo7_piece_16b = extrude(amount=18.6, mode=Mode.PRIVATE)
    redondeo7_piece_16b = split(redondeo7_piece_16b, bisect_by=Plane(origin=(-10.679185343, 7, 0.679185343), z_dir=(0, -1, 0)), keep=Keep.TOP, mode=Mode.PRIVATE)
    redondeo7_piece_16 = redondeo7_piece_16a & redondeo7_piece_16b
    add(redondeo7_piece_16, mode=Mode.SUBTRACT)
    with BuildSketch(Plane(origin=(-16.5, 7, 0), x_dir=(0, 0, 1), z_dir=(-1, 0, 0))) as redondeo7_piece_17a_section:
        with BuildLine():
            CenterArc((REDONDEO7_R, -REDONDEO7_R), REDONDEO7_R, 90, 90)
            Line((0, -REDONDEO7_R), (0, 0))
            Line((0, 0), (REDONDEO7_R, 0))
        make_face()
    redondeo7_piece_17a = extrude(amount=14.5, mode=Mode.PRIVATE)
    redondeo7_piece_17a = split(redondeo7_piece_17a, bisect_by=Plane(origin=(-24, 6.320814657, 0.679185343), z_dir=(1, 0, 0)), keep=Keep.TOP, mode=Mode.PRIVATE)
    with BuildSketch(Plane(origin=(-24, -0.5, 0), x_dir=(1, 0, 0), z_dir=(0, 1, 0))) as redondeo7_piece_17b_section:
        with BuildLine():
            CenterArc((REDONDEO7_R, -REDONDEO7_R), REDONDEO7_R, 90, 90)
            Line((0, -REDONDEO7_R), (0, 0))
            Line((0, 0), (REDONDEO7_R, 0))
        make_face()
    redondeo7_piece_17b = extrude(amount=18.6, mode=Mode.PRIVATE)
    redondeo7_piece_17b = split(redondeo7_piece_17b, bisect_by=Plane(origin=(-23.320814657, 7, 0.679185343), z_dir=(0, -1, 0)), keep=Keep.TOP, mode=Mode.PRIVATE)
    redondeo7_piece_17 = redondeo7_piece_17a & redondeo7_piece_17b
    add(redondeo7_piece_17, mode=Mode.SUBTRACT)


solid = part.part
